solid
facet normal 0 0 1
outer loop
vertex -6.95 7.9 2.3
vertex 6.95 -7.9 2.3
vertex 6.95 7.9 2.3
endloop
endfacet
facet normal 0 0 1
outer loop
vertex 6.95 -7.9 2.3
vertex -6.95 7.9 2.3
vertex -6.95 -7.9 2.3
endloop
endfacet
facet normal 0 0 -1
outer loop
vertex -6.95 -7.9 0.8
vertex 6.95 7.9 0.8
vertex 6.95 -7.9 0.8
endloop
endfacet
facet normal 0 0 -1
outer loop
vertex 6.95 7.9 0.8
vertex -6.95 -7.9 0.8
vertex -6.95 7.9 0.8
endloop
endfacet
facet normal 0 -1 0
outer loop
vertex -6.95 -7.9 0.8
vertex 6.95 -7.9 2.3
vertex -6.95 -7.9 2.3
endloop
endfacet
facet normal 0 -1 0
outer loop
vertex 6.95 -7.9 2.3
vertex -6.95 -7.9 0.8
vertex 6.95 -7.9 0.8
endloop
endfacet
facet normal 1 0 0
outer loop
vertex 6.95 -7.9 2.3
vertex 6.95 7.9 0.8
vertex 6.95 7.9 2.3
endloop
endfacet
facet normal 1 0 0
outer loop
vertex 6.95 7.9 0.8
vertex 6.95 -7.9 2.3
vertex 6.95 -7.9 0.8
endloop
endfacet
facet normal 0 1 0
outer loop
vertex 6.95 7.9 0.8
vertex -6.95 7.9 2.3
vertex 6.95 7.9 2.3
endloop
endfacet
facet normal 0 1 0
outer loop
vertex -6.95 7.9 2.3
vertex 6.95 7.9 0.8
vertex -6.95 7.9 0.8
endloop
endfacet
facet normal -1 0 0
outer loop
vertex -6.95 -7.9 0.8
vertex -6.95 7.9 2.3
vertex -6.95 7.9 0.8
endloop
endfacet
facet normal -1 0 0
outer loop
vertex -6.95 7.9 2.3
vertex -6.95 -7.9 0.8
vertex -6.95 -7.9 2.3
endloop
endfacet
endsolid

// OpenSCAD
// file: defines.scad
// example012.stl is Mblock.stl, (c) 2009 Will Langford
// licensed under the Creative Commons - GNU GPL license.
// http://www.thingiverse.com/thing:753

//import("sim800c.stl", convexity=3);

// PCB

w = 15.7;
h = 17.0;
pin_fragments = 8;
// main file
// example012.stl is Mblock.stl, (c) 2009 Will Langford
// licensed under the Creative Commons - GNU GPL license.
// http://www.thingiverse.com/thing:753

//import("sim800c.stl", convexity=3);

// PCB

include <defines.scad>

// SHIELD

color("Silver")
  translate([-13.9/2, -15.8/2, 0.8])
    cube(size = [13.9, 15.8, 1.5], center = false);
